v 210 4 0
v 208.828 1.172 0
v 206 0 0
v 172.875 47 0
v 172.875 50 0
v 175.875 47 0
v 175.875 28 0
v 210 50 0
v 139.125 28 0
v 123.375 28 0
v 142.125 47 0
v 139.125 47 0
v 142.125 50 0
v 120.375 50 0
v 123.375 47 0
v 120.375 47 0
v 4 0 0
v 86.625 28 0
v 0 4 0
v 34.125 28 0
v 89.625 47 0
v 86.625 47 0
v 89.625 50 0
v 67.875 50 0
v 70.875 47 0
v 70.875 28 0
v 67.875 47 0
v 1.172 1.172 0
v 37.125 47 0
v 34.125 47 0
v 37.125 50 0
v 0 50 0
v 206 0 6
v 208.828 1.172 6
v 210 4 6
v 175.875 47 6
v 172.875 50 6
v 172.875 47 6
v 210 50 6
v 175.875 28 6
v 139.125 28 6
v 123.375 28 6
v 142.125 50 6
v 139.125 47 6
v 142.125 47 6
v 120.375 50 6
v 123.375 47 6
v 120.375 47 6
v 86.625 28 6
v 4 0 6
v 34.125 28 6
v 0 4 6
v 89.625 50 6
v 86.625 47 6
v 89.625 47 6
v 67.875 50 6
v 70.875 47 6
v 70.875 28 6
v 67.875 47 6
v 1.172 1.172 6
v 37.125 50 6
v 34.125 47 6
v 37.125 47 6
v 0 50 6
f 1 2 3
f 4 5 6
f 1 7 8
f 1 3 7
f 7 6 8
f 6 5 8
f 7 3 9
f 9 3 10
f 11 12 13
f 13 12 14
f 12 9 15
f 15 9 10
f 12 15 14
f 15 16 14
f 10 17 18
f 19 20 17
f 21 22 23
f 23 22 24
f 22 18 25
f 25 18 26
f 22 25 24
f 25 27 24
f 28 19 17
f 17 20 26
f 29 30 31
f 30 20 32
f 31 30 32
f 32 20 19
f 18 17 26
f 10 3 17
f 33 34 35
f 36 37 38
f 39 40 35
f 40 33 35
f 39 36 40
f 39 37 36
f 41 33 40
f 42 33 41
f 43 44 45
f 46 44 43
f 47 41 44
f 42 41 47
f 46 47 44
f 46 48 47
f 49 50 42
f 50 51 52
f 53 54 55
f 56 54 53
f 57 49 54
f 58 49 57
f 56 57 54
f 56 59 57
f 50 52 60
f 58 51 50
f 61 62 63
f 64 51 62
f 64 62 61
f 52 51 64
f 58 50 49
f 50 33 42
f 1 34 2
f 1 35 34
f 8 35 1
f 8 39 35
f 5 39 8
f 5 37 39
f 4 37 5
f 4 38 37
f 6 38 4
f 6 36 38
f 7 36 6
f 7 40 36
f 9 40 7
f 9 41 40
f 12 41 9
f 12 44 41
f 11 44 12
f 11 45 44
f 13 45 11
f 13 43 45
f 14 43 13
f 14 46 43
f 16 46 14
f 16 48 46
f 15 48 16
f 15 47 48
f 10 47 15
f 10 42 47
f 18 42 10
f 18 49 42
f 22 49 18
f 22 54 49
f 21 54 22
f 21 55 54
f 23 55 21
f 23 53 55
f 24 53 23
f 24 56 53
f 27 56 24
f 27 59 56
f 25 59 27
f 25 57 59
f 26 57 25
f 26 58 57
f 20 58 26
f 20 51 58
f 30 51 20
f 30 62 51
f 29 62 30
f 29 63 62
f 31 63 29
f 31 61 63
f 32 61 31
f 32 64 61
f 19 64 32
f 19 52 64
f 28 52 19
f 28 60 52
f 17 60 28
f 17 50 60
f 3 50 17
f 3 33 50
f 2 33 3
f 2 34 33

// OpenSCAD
$fn = 32;

// ----------------------------------------------------------------------
// Oversize slot bar: 210 mm bar with 3 oversize windows
// ----------------------------------------------------------------------

// --- parameters (mm) ---
profile_height = 6;       // extrusion height
profile_points = 32;      // points of the closed outline

profile = [[0, 4], [1.172, 1.172], [4, 0], [206, 0], [208.828, 1.172], [210, 4], [210, 50], [172.875, 50], [172.875, 47], [175.875, 47], [175.875, 28], [139.125, 28], [139.125, 47], [142.125, 47], [142.125, 50], [120.375, 50], [120.375, 47], [123.375, 47], [123.375, 28], [86.625, 28], [86.625, 47], [89.625, 47], [89.625, 50], [67.875, 50], [67.875, 47], [70.875, 47], [70.875, 28], [34.125, 28], [34.125, 47], [37.125, 47], [37.125, 50], [0, 50]];  // single closed polygon, 32 points, counter clockwise

// --- the one profile operation ---
linear_extrude(height = profile_height) polygon(points = profile);
